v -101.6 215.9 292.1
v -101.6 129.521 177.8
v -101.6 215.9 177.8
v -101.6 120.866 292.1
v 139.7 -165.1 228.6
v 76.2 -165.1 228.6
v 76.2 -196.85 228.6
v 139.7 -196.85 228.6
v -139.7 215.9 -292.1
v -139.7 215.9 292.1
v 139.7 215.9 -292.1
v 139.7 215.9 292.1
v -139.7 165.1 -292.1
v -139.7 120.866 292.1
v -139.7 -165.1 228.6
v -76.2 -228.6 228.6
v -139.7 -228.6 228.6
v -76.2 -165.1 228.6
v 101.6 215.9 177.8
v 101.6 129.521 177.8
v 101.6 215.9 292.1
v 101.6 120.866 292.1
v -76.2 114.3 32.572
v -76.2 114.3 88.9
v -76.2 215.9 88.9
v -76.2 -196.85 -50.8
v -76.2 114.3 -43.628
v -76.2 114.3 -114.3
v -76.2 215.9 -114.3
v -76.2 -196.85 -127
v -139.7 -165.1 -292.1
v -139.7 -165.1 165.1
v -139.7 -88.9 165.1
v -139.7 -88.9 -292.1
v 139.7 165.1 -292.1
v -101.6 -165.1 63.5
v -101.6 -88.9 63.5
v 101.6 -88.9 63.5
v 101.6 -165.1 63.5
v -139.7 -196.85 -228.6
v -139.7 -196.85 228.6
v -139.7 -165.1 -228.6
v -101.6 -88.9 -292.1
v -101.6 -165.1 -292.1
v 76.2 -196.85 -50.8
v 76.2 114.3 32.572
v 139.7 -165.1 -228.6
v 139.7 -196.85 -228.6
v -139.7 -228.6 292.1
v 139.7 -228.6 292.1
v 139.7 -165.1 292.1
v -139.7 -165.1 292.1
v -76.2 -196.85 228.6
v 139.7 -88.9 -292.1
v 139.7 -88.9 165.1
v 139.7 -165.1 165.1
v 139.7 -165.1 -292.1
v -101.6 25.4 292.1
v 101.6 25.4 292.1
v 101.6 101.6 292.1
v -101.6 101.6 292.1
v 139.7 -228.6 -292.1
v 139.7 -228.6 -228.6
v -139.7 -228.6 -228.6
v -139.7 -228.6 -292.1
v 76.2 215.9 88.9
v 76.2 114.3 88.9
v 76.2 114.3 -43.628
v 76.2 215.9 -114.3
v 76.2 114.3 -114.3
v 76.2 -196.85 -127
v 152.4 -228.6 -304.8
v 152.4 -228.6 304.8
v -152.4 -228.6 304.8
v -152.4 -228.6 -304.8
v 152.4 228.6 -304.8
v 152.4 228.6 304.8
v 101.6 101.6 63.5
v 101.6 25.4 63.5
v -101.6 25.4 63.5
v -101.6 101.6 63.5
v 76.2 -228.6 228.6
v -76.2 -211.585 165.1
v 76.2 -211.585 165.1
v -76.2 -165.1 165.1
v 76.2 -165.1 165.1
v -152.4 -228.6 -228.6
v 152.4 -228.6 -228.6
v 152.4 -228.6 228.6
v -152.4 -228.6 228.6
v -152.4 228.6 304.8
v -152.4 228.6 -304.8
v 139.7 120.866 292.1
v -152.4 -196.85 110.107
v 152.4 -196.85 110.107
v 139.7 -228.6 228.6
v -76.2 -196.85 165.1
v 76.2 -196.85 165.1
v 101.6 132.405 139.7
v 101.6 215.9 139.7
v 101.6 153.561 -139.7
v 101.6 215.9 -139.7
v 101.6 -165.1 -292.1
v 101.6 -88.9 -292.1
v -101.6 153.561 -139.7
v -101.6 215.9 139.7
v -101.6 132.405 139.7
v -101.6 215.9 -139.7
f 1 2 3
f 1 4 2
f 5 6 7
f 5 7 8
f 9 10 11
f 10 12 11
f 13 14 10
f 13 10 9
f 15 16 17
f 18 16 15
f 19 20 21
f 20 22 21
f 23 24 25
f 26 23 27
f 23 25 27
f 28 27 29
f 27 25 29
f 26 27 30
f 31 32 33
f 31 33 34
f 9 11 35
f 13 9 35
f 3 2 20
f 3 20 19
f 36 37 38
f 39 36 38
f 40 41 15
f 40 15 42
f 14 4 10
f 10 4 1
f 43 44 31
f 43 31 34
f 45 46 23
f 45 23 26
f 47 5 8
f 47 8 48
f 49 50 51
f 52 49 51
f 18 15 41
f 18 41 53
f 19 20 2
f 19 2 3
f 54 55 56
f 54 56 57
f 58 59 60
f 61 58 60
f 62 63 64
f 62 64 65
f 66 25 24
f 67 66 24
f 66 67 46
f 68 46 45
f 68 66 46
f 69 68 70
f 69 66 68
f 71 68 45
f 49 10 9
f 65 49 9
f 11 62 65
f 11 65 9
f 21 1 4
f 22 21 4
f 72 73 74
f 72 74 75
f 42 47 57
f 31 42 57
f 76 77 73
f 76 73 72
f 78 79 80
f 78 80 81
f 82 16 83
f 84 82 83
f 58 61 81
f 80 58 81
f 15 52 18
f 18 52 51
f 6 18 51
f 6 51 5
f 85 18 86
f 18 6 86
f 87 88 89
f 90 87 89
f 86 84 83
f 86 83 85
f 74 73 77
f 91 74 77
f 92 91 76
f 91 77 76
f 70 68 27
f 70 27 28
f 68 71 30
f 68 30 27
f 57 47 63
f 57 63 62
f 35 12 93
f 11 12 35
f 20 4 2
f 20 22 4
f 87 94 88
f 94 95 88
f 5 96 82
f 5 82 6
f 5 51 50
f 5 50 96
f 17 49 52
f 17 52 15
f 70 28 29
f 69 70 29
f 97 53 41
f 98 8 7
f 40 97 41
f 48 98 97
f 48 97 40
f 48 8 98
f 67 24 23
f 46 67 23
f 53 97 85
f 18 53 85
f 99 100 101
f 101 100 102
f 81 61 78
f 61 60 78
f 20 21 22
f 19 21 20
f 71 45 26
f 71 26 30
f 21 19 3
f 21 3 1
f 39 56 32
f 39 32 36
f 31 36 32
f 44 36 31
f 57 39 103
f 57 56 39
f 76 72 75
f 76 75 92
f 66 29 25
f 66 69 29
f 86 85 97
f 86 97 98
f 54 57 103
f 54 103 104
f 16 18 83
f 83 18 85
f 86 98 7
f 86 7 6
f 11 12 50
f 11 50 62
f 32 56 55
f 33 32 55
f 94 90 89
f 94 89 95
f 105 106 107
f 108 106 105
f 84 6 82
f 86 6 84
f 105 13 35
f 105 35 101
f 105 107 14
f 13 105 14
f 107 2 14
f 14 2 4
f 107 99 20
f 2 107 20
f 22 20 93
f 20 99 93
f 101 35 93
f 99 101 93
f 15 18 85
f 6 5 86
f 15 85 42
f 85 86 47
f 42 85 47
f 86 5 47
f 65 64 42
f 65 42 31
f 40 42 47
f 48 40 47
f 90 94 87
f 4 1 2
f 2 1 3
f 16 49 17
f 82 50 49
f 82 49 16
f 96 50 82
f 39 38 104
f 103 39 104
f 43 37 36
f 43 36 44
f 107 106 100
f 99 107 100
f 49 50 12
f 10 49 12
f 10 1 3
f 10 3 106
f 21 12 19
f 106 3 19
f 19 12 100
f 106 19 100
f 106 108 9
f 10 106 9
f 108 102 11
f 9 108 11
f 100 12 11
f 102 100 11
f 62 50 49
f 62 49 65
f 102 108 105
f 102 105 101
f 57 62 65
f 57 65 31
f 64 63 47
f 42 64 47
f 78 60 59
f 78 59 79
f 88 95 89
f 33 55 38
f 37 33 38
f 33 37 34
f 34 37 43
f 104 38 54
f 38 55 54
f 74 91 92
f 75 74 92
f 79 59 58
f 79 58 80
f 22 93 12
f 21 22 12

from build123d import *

# Parameters (mm, degrees)
SKETCH2_W                               = 609.6
SKETCH2_H                               = 457.2
VOLUME_ENVELOPE_DEPTH                   = 152.4
SKETCH4_W                               = 584.2
SKETCH4_H                               = 444.5
SAFE_VOLUME_DEPTH                       = 139.7
RAMP_INTERFERENCE_DEPTH                 = 152.4
DRIVE_SYSTEM_REACH                      = 412.35
SKETCH5_W                               = 63.5
SKETCH5_H                               = 63.5
DRIVE_SYSTEM_DIRECTION_2_REACH          = 412.35
DRIVE_MOTOR_DEPTH                       = 76.2
DRIVE_MOTOR_DEPTH_BACK                  = 76.2
BASE_PLATE_REACH                        = 412.35
SKETCH7_W                               = 584.2
SKETCH7_H                               = 31.75
BASE_PLATE_DIRECTION_2_REACH            = 412.35
INDENT1_START                           = 165.1
INDENT1_OUTLINE_W                       = 152.4
INDENT1_OUTLINE_H                       = 31.75
INDENT1_DEPTH                           = 127
INDENT1_START_2                         = -292.1
INDENT1_2_OUTLINE_W                     = 279.4
INDENT1_2_OUTLINE_H                     = 31.75
INDENT1_2_DEPTH                         = 63.5
INDENT1_START_3                         = 228.6
INDENT1_3_OUTLINE_W                     = 63.5
INDENT1_3_OUTLINE_H                     = 31.75
INDENT1_3_DEPTH                         = 63.5
SLIDE_SYSTEM_REACH                      = 412.35
SLIDE_SYSTEM_DIRECTION_2_REACH          = 412.35
SKETCH9_W                               = 203.2
SKETCH9_H                               = 279.4
MARIOCUTOUT_DEPTH                       = 561.097357608
SORTER_DEPTH                            = 101.6
SORTERCUTOUT_START                      = -101.6
SORTERCUTOUT_DEPTH                      = 203.2
SKETCH11_W                              = 228.6
SKETCH11_H                              = 76.2
LUMA_DEPOSITER_DEPTH                    = 101.6
MARIO_LIFTER_DEPTH                      = 76.2
KOOPER_COIN_MECHANISM_REACH             = 412.35
SKETCH13_W                              = 457.2
SKETCH13_H                              = 76.2
KOOPER_COIN_MECHANISM_DIRECTION_2_REACH = 412.35
SKETCH14_W                              = 203.2
SKETCH14_H                              = 355.6
CUT_EXTRUDE2_DEPTH                      = 466.762868851


# Read off the part's stored shape, not the designer's step: Indent1, SorterCutout
with BuildPart() as part:
    # Sketch2 → Volume Envelope (new, symmetric)
    with BuildSketch(Plane(origin=(0, 0, 0), x_dir=(0, 0, -1), z_dir=(1, 0, 0))):
        Rectangle(SKETCH2_W, SKETCH2_H)
    extrude(amount=VOLUME_ENVELOPE_DEPTH, both=True)


with BuildPart() as body_2:
    # Sketch4 → Safe Volume (new, symmetric)
    with BuildSketch(Plane(origin=(0, 0, 0), x_dir=(0, 0, -1), z_dir=(1, 0, 0))):
        with Locations((0, -6.35)):
            Rectangle(SKETCH4_W, SKETCH4_H)
    extrude(amount=SAFE_VOLUME_DEPTH, both=True)


with BuildPart() as body_3:
    # Sketch1 → Ramp Interference (new, symmetric)
    with BuildSketch(Plane(origin=(0, 0, 0), x_dir=(0, 0, -1), z_dir=(1, 0, 0))):
        Polygon((-228.6, -228.6), (-110.10738686, -196.85), (228.6, -228.6), align=None)
    extrude(amount=RAMP_INTERFERENCE_DEPTH, both=True)


with BuildPart() as body_4:

    # Drive System: up to this face of the body (flat: up to its plane)
    drive_system_end = Plane(body_2.part.faces().sort_by_distance((139.7, -6.35, 0))[0])
    # Sketch5 → Drive System (new, up to the picked face)
    with BuildSketch(Plane(origin=(0, 0, 0), x_dir=(0, 0, -1), z_dir=(1, 0, 0)), mode=Mode.PRIVATE) as drive_system_sk1:
        with Locations((-260.35, -196.85)):
            Rectangle(SKETCH5_W, SKETCH5_H)
    drive_system_tool1 = split(extrude(drive_system_sk1.sketch, amount=DRIVE_SYSTEM_REACH, mode=Mode.PRIVATE), bisect_by=drive_system_end, keep=Keep.BOTH, mode=Mode.PRIVATE)
    # Sketch5 → Drive System (new, up to the picked face)
    with BuildSketch(Plane(origin=(0, 0, 0), x_dir=(0, 0, -1), z_dir=(1, 0, 0)), mode=Mode.PRIVATE) as drive_system_sk2:
        with Locations((260.35, -196.85)):
            Rectangle(SKETCH5_W, SKETCH5_H)
    drive_system_tool2 = split(extrude(drive_system_sk2.sketch, amount=DRIVE_SYSTEM_REACH, mode=Mode.PRIVATE), bisect_by=drive_system_end, keep=Keep.BOTH, mode=Mode.PRIVATE)
    add(drive_system_tool1.solids().sort_by(Axis((0, -196.85, 260.35), (1, 0, 0)))[0])
    add(drive_system_tool2.solids().sort_by(Axis((0, -196.85, -260.35), (1, 0, 0)))[0])


    # Drive System direction 2: up to this face of the body (flat: up to its plane)
    drive_system_direction_2_end = Plane(body_2.part.faces().sort_by_distance((-139.7, -6.35, 0))[0])
    # Sketch5 → Drive System direction 2 (add, up to the picked face)
    with BuildSketch(Plane(origin=(0, 0, 0), x_dir=(0, 0, -1), z_dir=(1, 0, 0)), mode=Mode.PRIVATE) as drive_system_direction_2_sk1:
        with Locations((-260.35, -196.85)):
            Rectangle(SKETCH5_W, SKETCH5_H)
    drive_system_direction_2_tool1 = split(extrude(drive_system_direction_2_sk1.sketch, amount=-DRIVE_SYSTEM_DIRECTION_2_REACH, mode=Mode.PRIVATE), bisect_by=drive_system_direction_2_end, keep=Keep.BOTH, mode=Mode.PRIVATE)
    # Sketch5 → Drive System direction 2 (add, up to the picked face)
    with BuildSketch(Plane(origin=(0, 0, 0), x_dir=(0, 0, -1), z_dir=(1, 0, 0)), mode=Mode.PRIVATE) as drive_system_direction_2_sk2:
        with Locations((260.35, -196.85)):
            Rectangle(SKETCH5_W, SKETCH5_H)
    drive_system_direction_2_tool2 = split(extrude(drive_system_direction_2_sk2.sketch, amount=-DRIVE_SYSTEM_DIRECTION_2_REACH, mode=Mode.PRIVATE), bisect_by=drive_system_direction_2_end, keep=Keep.BOTH, mode=Mode.PRIVATE)
    add(drive_system_direction_2_tool1.solids().sort_by(Axis((0, -196.85, 260.35), (-1, 0, 0)))[0])
    add(drive_system_direction_2_tool2.solids().sort_by(Axis((0, -196.85, -260.35), (-1, 0, 0)))[0])

    # Sketch6 → Drive Motor (add, two sides: drawn at the far end of the back side and taken through both)
    with BuildSketch(Plane(origin=(0, 0, 0), x_dir=(0, 0, -1), z_dir=(1, 0, 0)).offset(-DRIVE_MOTOR_DEPTH_BACK)):
        Polygon((-228.6, -228.6), (-165.1, -211.585226281), (-165.1, -165.1), (-228.6, -165.1), align=None)
    extrude(amount=DRIVE_MOTOR_DEPTH + DRIVE_MOTOR_DEPTH_BACK)


with BuildPart() as body_5:

    # Base Plate: up to this face of the body (flat: up to its plane)
    base_plate_end = Plane(body_2.part.faces().sort_by_distance((139.7, -6.35, 0))[0])
    # Sketch7 → Base Plate (new, up to the picked face)
    with BuildSketch(Plane(origin=(0, 0, 0), x_dir=(0, 0, -1), z_dir=(1, 0, 0)), mode=Mode.PRIVATE) as base_plate_sk1:
        with Locations((0, -180.975)):
            Rectangle(SKETCH7_W, SKETCH7_H)
    base_plate_tool1 = split(extrude(base_plate_sk1.sketch, amount=BASE_PLATE_REACH, mode=Mode.PRIVATE), bisect_by=base_plate_end, keep=Keep.BOTH, mode=Mode.PRIVATE)
    add(base_plate_tool1.solids().sort_by(Axis((0, -180.975, 0), (1, 0, 0)))[0])


    # Base Plate direction 2: up to this face of the body (flat: up to its plane)
    base_plate_direction_2_end = Plane(body_2.part.faces().sort_by_distance((-139.7, -6.35, 0))[0])
    # Sketch7 → Base Plate direction 2 (add, up to the picked face)
    with BuildSketch(Plane(origin=(0, 0, 0), x_dir=(0, 0, -1), z_dir=(1, 0, 0)), mode=Mode.PRIVATE) as base_plate_direction_2_sk1:
        with Locations((0, -180.975)):
            Rectangle(SKETCH7_W, SKETCH7_H)
    base_plate_direction_2_tool1 = split(extrude(base_plate_direction_2_sk1.sketch, amount=-BASE_PLATE_DIRECTION_2_REACH, mode=Mode.PRIVATE), bisect_by=base_plate_direction_2_end, keep=Keep.BOTH, mode=Mode.PRIVATE)
    add(base_plate_direction_2_tool1.solids().sort_by(Axis((0, -180.975, 0), (-1, 0, 0)))[0])

    # Indent1 outline → Indent1 (cut)
    with BuildSketch(Plane.XY.offset(INDENT1_START)):
        with Locations((0, -180.975)):
            Rectangle(INDENT1_OUTLINE_W, INDENT1_OUTLINE_H)
    extrude(amount=INDENT1_DEPTH, mode=Mode.SUBTRACT)

    # Indent1 2 outline → Indent1 2 (cut)
    with BuildSketch(Plane.XY.offset(INDENT1_START_2)):
        with Locations((0, -180.975)):
            Rectangle(INDENT1_2_OUTLINE_W, INDENT1_2_OUTLINE_H)
    extrude(amount=INDENT1_2_DEPTH, mode=Mode.SUBTRACT)

    # Indent1 3 outline → Indent1 3 (cut)
    with BuildSketch(Plane.XY.offset(INDENT1_START_3)):
        with Locations((-107.95, -180.975)):
            Rectangle(INDENT1_3_OUTLINE_W, INDENT1_3_OUTLINE_H)
        with Locations((107.95, -180.975)):
            Rectangle(INDENT1_3_OUTLINE_W, INDENT1_3_OUTLINE_H)
    extrude(amount=INDENT1_3_DEPTH, mode=Mode.SUBTRACT)


with BuildPart() as body_6:

    # Slide System: up to this face of the body (flat: up to its plane)
    slide_system_end = Plane(body_2.part.faces().sort_by_distance((139.7, -6.35, 0))[0])
    # Sketch8 → Slide System (new, up to the picked face)
    with BuildSketch(Plane(origin=(0, 0, 0), x_dir=(0, 0, -1), z_dir=(1, 0, 0)), mode=Mode.PRIVATE) as slide_system_sk1:
        Polygon((-292.1, 120.866153447), (-292.1, 215.9), (292.1, 215.9), (292.1, 165.1), align=None)
    slide_system_tool1 = split(extrude(slide_system_sk1.sketch, amount=SLIDE_SYSTEM_REACH, mode=Mode.PRIVATE), bisect_by=slide_system_end, keep=Keep.BOTH, mode=Mode.PRIVATE)
    add(slide_system_tool1.solids().sort_by(Axis((0, 178.323466, 29.53294), (1, 0, 0)))[0])


    # Slide System direction 2: up to this face of the body (flat: up to its plane)
    slide_system_direction_2_end = Plane(body_2.part.faces().sort_by_distance((-139.7, -6.35, 0))[0])
    # Sketch8 → Slide System direction 2 (add, up to the picked face)
    with BuildSketch(Plane(origin=(0, 0, 0), x_dir=(0, 0, -1), z_dir=(1, 0, 0)), mode=Mode.PRIVATE) as slide_system_direction_2_sk1:
        Polygon((-292.1, 120.866153447), (-292.1, 215.9), (292.1, 215.9), (292.1, 165.1), align=None)
    slide_system_direction_2_tool1 = split(extrude(slide_system_direction_2_sk1.sketch, amount=-SLIDE_SYSTEM_DIRECTION_2_REACH, mode=Mode.PRIVATE), bisect_by=slide_system_direction_2_end, keep=Keep.BOTH, mode=Mode.PRIVATE)
    add(slide_system_direction_2_tool1.solids().sort_by(Axis((0, 178.323466, 29.53294), (-1, 0, 0)))[0])

    # Sketch9 → MarioCutout (cut, through all)
    with BuildSketch(Plane(origin=(0, 215.9, 0), x_dir=(1, 0, 0), z_dir=(0, 1, 0))):
        Rectangle(SKETCH9_W, SKETCH9_H)
    extrude(amount=-MARIOCUTOUT_DEPTH, mode=Mode.SUBTRACT)

    # SorterCutout outline → SorterCutout (cut)
    with BuildSketch(Plane.YZ.offset(SORTERCUTOUT_START)):
        Polygon((129.520601685, 177.8), (215.9, 177.8), (215.9, 292.1), (120.866153447, 292.1), align=None)
    extrude(amount=SORTERCUTOUT_DEPTH, mode=Mode.SUBTRACT)


with BuildPart() as body_7:
    # Sketch10 → Sorter (new, symmetric)
    with BuildSketch(Plane(origin=(0, 0, 0), x_dir=(0, 0, -1), z_dir=(1, 0, 0))):
        Polygon((-292.1, 120.866153447), (-177.8, 129.520601685), (-177.8, 215.9), (-292.1, 215.9), align=None)
    extrude(amount=SORTER_DEPTH, both=True)


with BuildPart() as body_8:
    # Sketch11 → Luma Depositer (new, symmetric)
    with BuildSketch(Plane(origin=(0, 0, 0), x_dir=(0, 0, -1), z_dir=(1, 0, 0))):
        with Locations((-177.8, 63.5)):
            Rectangle(SKETCH11_W, SKETCH11_H)
    extrude(amount=LUMA_DEPOSITER_DEPTH, both=True)


with BuildPart() as body_9:
    # Sketch12 → Mario Lifter (new, symmetric)
    with BuildSketch(Plane(origin=(0, 0, 0), x_dir=(0, 0, -1), z_dir=(1, 0, 0))):
        Polygon((-88.9, 215.9), (-88.9, 114.3), (-32.572391225, 114.3), (50.8, -196.85), (127, -196.85), (43.627608775, 114.3), (114.3, 114.3), (114.3, 215.9), align=None)
    extrude(amount=MARIO_LIFTER_DEPTH, both=True)


with BuildPart() as body_10:

    # Kooper/Coin Mechanism: up to this face of the body (flat: up to its plane)
    kooper_coin_mechanism_end = Plane(body_2.part.faces().sort_by_distance((139.7, -6.35, 0))[0])
    # Sketch13 → Kooper/Coin Mechanism (new, up to the picked face)
    with BuildSketch(Plane(origin=(0, 0, 0), x_dir=(0, 0, -1), z_dir=(1, 0, 0)), mode=Mode.PRIVATE) as kooper_coin_mechanism_sk1:
        with Locations((63.5, -127)):
            Rectangle(SKETCH13_W, SKETCH13_H)
    kooper_coin_mechanism_tool1 = split(extrude(kooper_coin_mechanism_sk1.sketch, amount=KOOPER_COIN_MECHANISM_REACH, mode=Mode.PRIVATE), bisect_by=kooper_coin_mechanism_end, keep=Keep.BOTH, mode=Mode.PRIVATE)
    add(kooper_coin_mechanism_tool1.solids().sort_by(Axis((0, -127, -63.5), (1, 0, 0)))[0])


    # Kooper/Coin Mechanism direction 2: up to this face of the body (flat: up to its plane)
    kooper_coin_mechanism_direction_2_end = Plane(body_2.part.faces().sort_by_distance((-139.7, -6.35, 0))[0])
    # Sketch13 → Kooper/Coin Mechanism direction 2 (add, up to the picked face)
    with BuildSketch(Plane(origin=(0, 0, 0), x_dir=(0, 0, -1), z_dir=(1, 0, 0)), mode=Mode.PRIVATE) as kooper_coin_mechanism_direction_2_sk1:
        with Locations((63.5, -127)):
            Rectangle(SKETCH13_W, SKETCH13_H)
    kooper_coin_mechanism_direction_2_tool1 = split(extrude(kooper_coin_mechanism_direction_2_sk1.sketch, amount=-KOOPER_COIN_MECHANISM_DIRECTION_2_REACH, mode=Mode.PRIVATE), bisect_by=kooper_coin_mechanism_direction_2_end, keep=Keep.BOTH, mode=Mode.PRIVATE)
    add(kooper_coin_mechanism_direction_2_tool1.solids().sort_by(Axis((0, -127, -63.5), (-1, 0, 0)))[0])

    # Sketch14 → Cut-Extrude2 (cut, through all)
    with BuildSketch(Plane(origin=(0, -88.9, 0), x_dir=(1, 0, 0), z_dir=(0, 1, 0))):
        with Locations((0, 114.3)):
            Rectangle(SKETCH14_W, SKETCH14_H)
    extrude(amount=-CUT_EXTRUDE2_DEPTH, mode=Mode.SUBTRACT)


solid = Compound([part.part, body_2.part, body_3.part, body_4.part, body_5.part, body_6.part, body_7.part, body_8.part, body_9.part, body_10.part])
